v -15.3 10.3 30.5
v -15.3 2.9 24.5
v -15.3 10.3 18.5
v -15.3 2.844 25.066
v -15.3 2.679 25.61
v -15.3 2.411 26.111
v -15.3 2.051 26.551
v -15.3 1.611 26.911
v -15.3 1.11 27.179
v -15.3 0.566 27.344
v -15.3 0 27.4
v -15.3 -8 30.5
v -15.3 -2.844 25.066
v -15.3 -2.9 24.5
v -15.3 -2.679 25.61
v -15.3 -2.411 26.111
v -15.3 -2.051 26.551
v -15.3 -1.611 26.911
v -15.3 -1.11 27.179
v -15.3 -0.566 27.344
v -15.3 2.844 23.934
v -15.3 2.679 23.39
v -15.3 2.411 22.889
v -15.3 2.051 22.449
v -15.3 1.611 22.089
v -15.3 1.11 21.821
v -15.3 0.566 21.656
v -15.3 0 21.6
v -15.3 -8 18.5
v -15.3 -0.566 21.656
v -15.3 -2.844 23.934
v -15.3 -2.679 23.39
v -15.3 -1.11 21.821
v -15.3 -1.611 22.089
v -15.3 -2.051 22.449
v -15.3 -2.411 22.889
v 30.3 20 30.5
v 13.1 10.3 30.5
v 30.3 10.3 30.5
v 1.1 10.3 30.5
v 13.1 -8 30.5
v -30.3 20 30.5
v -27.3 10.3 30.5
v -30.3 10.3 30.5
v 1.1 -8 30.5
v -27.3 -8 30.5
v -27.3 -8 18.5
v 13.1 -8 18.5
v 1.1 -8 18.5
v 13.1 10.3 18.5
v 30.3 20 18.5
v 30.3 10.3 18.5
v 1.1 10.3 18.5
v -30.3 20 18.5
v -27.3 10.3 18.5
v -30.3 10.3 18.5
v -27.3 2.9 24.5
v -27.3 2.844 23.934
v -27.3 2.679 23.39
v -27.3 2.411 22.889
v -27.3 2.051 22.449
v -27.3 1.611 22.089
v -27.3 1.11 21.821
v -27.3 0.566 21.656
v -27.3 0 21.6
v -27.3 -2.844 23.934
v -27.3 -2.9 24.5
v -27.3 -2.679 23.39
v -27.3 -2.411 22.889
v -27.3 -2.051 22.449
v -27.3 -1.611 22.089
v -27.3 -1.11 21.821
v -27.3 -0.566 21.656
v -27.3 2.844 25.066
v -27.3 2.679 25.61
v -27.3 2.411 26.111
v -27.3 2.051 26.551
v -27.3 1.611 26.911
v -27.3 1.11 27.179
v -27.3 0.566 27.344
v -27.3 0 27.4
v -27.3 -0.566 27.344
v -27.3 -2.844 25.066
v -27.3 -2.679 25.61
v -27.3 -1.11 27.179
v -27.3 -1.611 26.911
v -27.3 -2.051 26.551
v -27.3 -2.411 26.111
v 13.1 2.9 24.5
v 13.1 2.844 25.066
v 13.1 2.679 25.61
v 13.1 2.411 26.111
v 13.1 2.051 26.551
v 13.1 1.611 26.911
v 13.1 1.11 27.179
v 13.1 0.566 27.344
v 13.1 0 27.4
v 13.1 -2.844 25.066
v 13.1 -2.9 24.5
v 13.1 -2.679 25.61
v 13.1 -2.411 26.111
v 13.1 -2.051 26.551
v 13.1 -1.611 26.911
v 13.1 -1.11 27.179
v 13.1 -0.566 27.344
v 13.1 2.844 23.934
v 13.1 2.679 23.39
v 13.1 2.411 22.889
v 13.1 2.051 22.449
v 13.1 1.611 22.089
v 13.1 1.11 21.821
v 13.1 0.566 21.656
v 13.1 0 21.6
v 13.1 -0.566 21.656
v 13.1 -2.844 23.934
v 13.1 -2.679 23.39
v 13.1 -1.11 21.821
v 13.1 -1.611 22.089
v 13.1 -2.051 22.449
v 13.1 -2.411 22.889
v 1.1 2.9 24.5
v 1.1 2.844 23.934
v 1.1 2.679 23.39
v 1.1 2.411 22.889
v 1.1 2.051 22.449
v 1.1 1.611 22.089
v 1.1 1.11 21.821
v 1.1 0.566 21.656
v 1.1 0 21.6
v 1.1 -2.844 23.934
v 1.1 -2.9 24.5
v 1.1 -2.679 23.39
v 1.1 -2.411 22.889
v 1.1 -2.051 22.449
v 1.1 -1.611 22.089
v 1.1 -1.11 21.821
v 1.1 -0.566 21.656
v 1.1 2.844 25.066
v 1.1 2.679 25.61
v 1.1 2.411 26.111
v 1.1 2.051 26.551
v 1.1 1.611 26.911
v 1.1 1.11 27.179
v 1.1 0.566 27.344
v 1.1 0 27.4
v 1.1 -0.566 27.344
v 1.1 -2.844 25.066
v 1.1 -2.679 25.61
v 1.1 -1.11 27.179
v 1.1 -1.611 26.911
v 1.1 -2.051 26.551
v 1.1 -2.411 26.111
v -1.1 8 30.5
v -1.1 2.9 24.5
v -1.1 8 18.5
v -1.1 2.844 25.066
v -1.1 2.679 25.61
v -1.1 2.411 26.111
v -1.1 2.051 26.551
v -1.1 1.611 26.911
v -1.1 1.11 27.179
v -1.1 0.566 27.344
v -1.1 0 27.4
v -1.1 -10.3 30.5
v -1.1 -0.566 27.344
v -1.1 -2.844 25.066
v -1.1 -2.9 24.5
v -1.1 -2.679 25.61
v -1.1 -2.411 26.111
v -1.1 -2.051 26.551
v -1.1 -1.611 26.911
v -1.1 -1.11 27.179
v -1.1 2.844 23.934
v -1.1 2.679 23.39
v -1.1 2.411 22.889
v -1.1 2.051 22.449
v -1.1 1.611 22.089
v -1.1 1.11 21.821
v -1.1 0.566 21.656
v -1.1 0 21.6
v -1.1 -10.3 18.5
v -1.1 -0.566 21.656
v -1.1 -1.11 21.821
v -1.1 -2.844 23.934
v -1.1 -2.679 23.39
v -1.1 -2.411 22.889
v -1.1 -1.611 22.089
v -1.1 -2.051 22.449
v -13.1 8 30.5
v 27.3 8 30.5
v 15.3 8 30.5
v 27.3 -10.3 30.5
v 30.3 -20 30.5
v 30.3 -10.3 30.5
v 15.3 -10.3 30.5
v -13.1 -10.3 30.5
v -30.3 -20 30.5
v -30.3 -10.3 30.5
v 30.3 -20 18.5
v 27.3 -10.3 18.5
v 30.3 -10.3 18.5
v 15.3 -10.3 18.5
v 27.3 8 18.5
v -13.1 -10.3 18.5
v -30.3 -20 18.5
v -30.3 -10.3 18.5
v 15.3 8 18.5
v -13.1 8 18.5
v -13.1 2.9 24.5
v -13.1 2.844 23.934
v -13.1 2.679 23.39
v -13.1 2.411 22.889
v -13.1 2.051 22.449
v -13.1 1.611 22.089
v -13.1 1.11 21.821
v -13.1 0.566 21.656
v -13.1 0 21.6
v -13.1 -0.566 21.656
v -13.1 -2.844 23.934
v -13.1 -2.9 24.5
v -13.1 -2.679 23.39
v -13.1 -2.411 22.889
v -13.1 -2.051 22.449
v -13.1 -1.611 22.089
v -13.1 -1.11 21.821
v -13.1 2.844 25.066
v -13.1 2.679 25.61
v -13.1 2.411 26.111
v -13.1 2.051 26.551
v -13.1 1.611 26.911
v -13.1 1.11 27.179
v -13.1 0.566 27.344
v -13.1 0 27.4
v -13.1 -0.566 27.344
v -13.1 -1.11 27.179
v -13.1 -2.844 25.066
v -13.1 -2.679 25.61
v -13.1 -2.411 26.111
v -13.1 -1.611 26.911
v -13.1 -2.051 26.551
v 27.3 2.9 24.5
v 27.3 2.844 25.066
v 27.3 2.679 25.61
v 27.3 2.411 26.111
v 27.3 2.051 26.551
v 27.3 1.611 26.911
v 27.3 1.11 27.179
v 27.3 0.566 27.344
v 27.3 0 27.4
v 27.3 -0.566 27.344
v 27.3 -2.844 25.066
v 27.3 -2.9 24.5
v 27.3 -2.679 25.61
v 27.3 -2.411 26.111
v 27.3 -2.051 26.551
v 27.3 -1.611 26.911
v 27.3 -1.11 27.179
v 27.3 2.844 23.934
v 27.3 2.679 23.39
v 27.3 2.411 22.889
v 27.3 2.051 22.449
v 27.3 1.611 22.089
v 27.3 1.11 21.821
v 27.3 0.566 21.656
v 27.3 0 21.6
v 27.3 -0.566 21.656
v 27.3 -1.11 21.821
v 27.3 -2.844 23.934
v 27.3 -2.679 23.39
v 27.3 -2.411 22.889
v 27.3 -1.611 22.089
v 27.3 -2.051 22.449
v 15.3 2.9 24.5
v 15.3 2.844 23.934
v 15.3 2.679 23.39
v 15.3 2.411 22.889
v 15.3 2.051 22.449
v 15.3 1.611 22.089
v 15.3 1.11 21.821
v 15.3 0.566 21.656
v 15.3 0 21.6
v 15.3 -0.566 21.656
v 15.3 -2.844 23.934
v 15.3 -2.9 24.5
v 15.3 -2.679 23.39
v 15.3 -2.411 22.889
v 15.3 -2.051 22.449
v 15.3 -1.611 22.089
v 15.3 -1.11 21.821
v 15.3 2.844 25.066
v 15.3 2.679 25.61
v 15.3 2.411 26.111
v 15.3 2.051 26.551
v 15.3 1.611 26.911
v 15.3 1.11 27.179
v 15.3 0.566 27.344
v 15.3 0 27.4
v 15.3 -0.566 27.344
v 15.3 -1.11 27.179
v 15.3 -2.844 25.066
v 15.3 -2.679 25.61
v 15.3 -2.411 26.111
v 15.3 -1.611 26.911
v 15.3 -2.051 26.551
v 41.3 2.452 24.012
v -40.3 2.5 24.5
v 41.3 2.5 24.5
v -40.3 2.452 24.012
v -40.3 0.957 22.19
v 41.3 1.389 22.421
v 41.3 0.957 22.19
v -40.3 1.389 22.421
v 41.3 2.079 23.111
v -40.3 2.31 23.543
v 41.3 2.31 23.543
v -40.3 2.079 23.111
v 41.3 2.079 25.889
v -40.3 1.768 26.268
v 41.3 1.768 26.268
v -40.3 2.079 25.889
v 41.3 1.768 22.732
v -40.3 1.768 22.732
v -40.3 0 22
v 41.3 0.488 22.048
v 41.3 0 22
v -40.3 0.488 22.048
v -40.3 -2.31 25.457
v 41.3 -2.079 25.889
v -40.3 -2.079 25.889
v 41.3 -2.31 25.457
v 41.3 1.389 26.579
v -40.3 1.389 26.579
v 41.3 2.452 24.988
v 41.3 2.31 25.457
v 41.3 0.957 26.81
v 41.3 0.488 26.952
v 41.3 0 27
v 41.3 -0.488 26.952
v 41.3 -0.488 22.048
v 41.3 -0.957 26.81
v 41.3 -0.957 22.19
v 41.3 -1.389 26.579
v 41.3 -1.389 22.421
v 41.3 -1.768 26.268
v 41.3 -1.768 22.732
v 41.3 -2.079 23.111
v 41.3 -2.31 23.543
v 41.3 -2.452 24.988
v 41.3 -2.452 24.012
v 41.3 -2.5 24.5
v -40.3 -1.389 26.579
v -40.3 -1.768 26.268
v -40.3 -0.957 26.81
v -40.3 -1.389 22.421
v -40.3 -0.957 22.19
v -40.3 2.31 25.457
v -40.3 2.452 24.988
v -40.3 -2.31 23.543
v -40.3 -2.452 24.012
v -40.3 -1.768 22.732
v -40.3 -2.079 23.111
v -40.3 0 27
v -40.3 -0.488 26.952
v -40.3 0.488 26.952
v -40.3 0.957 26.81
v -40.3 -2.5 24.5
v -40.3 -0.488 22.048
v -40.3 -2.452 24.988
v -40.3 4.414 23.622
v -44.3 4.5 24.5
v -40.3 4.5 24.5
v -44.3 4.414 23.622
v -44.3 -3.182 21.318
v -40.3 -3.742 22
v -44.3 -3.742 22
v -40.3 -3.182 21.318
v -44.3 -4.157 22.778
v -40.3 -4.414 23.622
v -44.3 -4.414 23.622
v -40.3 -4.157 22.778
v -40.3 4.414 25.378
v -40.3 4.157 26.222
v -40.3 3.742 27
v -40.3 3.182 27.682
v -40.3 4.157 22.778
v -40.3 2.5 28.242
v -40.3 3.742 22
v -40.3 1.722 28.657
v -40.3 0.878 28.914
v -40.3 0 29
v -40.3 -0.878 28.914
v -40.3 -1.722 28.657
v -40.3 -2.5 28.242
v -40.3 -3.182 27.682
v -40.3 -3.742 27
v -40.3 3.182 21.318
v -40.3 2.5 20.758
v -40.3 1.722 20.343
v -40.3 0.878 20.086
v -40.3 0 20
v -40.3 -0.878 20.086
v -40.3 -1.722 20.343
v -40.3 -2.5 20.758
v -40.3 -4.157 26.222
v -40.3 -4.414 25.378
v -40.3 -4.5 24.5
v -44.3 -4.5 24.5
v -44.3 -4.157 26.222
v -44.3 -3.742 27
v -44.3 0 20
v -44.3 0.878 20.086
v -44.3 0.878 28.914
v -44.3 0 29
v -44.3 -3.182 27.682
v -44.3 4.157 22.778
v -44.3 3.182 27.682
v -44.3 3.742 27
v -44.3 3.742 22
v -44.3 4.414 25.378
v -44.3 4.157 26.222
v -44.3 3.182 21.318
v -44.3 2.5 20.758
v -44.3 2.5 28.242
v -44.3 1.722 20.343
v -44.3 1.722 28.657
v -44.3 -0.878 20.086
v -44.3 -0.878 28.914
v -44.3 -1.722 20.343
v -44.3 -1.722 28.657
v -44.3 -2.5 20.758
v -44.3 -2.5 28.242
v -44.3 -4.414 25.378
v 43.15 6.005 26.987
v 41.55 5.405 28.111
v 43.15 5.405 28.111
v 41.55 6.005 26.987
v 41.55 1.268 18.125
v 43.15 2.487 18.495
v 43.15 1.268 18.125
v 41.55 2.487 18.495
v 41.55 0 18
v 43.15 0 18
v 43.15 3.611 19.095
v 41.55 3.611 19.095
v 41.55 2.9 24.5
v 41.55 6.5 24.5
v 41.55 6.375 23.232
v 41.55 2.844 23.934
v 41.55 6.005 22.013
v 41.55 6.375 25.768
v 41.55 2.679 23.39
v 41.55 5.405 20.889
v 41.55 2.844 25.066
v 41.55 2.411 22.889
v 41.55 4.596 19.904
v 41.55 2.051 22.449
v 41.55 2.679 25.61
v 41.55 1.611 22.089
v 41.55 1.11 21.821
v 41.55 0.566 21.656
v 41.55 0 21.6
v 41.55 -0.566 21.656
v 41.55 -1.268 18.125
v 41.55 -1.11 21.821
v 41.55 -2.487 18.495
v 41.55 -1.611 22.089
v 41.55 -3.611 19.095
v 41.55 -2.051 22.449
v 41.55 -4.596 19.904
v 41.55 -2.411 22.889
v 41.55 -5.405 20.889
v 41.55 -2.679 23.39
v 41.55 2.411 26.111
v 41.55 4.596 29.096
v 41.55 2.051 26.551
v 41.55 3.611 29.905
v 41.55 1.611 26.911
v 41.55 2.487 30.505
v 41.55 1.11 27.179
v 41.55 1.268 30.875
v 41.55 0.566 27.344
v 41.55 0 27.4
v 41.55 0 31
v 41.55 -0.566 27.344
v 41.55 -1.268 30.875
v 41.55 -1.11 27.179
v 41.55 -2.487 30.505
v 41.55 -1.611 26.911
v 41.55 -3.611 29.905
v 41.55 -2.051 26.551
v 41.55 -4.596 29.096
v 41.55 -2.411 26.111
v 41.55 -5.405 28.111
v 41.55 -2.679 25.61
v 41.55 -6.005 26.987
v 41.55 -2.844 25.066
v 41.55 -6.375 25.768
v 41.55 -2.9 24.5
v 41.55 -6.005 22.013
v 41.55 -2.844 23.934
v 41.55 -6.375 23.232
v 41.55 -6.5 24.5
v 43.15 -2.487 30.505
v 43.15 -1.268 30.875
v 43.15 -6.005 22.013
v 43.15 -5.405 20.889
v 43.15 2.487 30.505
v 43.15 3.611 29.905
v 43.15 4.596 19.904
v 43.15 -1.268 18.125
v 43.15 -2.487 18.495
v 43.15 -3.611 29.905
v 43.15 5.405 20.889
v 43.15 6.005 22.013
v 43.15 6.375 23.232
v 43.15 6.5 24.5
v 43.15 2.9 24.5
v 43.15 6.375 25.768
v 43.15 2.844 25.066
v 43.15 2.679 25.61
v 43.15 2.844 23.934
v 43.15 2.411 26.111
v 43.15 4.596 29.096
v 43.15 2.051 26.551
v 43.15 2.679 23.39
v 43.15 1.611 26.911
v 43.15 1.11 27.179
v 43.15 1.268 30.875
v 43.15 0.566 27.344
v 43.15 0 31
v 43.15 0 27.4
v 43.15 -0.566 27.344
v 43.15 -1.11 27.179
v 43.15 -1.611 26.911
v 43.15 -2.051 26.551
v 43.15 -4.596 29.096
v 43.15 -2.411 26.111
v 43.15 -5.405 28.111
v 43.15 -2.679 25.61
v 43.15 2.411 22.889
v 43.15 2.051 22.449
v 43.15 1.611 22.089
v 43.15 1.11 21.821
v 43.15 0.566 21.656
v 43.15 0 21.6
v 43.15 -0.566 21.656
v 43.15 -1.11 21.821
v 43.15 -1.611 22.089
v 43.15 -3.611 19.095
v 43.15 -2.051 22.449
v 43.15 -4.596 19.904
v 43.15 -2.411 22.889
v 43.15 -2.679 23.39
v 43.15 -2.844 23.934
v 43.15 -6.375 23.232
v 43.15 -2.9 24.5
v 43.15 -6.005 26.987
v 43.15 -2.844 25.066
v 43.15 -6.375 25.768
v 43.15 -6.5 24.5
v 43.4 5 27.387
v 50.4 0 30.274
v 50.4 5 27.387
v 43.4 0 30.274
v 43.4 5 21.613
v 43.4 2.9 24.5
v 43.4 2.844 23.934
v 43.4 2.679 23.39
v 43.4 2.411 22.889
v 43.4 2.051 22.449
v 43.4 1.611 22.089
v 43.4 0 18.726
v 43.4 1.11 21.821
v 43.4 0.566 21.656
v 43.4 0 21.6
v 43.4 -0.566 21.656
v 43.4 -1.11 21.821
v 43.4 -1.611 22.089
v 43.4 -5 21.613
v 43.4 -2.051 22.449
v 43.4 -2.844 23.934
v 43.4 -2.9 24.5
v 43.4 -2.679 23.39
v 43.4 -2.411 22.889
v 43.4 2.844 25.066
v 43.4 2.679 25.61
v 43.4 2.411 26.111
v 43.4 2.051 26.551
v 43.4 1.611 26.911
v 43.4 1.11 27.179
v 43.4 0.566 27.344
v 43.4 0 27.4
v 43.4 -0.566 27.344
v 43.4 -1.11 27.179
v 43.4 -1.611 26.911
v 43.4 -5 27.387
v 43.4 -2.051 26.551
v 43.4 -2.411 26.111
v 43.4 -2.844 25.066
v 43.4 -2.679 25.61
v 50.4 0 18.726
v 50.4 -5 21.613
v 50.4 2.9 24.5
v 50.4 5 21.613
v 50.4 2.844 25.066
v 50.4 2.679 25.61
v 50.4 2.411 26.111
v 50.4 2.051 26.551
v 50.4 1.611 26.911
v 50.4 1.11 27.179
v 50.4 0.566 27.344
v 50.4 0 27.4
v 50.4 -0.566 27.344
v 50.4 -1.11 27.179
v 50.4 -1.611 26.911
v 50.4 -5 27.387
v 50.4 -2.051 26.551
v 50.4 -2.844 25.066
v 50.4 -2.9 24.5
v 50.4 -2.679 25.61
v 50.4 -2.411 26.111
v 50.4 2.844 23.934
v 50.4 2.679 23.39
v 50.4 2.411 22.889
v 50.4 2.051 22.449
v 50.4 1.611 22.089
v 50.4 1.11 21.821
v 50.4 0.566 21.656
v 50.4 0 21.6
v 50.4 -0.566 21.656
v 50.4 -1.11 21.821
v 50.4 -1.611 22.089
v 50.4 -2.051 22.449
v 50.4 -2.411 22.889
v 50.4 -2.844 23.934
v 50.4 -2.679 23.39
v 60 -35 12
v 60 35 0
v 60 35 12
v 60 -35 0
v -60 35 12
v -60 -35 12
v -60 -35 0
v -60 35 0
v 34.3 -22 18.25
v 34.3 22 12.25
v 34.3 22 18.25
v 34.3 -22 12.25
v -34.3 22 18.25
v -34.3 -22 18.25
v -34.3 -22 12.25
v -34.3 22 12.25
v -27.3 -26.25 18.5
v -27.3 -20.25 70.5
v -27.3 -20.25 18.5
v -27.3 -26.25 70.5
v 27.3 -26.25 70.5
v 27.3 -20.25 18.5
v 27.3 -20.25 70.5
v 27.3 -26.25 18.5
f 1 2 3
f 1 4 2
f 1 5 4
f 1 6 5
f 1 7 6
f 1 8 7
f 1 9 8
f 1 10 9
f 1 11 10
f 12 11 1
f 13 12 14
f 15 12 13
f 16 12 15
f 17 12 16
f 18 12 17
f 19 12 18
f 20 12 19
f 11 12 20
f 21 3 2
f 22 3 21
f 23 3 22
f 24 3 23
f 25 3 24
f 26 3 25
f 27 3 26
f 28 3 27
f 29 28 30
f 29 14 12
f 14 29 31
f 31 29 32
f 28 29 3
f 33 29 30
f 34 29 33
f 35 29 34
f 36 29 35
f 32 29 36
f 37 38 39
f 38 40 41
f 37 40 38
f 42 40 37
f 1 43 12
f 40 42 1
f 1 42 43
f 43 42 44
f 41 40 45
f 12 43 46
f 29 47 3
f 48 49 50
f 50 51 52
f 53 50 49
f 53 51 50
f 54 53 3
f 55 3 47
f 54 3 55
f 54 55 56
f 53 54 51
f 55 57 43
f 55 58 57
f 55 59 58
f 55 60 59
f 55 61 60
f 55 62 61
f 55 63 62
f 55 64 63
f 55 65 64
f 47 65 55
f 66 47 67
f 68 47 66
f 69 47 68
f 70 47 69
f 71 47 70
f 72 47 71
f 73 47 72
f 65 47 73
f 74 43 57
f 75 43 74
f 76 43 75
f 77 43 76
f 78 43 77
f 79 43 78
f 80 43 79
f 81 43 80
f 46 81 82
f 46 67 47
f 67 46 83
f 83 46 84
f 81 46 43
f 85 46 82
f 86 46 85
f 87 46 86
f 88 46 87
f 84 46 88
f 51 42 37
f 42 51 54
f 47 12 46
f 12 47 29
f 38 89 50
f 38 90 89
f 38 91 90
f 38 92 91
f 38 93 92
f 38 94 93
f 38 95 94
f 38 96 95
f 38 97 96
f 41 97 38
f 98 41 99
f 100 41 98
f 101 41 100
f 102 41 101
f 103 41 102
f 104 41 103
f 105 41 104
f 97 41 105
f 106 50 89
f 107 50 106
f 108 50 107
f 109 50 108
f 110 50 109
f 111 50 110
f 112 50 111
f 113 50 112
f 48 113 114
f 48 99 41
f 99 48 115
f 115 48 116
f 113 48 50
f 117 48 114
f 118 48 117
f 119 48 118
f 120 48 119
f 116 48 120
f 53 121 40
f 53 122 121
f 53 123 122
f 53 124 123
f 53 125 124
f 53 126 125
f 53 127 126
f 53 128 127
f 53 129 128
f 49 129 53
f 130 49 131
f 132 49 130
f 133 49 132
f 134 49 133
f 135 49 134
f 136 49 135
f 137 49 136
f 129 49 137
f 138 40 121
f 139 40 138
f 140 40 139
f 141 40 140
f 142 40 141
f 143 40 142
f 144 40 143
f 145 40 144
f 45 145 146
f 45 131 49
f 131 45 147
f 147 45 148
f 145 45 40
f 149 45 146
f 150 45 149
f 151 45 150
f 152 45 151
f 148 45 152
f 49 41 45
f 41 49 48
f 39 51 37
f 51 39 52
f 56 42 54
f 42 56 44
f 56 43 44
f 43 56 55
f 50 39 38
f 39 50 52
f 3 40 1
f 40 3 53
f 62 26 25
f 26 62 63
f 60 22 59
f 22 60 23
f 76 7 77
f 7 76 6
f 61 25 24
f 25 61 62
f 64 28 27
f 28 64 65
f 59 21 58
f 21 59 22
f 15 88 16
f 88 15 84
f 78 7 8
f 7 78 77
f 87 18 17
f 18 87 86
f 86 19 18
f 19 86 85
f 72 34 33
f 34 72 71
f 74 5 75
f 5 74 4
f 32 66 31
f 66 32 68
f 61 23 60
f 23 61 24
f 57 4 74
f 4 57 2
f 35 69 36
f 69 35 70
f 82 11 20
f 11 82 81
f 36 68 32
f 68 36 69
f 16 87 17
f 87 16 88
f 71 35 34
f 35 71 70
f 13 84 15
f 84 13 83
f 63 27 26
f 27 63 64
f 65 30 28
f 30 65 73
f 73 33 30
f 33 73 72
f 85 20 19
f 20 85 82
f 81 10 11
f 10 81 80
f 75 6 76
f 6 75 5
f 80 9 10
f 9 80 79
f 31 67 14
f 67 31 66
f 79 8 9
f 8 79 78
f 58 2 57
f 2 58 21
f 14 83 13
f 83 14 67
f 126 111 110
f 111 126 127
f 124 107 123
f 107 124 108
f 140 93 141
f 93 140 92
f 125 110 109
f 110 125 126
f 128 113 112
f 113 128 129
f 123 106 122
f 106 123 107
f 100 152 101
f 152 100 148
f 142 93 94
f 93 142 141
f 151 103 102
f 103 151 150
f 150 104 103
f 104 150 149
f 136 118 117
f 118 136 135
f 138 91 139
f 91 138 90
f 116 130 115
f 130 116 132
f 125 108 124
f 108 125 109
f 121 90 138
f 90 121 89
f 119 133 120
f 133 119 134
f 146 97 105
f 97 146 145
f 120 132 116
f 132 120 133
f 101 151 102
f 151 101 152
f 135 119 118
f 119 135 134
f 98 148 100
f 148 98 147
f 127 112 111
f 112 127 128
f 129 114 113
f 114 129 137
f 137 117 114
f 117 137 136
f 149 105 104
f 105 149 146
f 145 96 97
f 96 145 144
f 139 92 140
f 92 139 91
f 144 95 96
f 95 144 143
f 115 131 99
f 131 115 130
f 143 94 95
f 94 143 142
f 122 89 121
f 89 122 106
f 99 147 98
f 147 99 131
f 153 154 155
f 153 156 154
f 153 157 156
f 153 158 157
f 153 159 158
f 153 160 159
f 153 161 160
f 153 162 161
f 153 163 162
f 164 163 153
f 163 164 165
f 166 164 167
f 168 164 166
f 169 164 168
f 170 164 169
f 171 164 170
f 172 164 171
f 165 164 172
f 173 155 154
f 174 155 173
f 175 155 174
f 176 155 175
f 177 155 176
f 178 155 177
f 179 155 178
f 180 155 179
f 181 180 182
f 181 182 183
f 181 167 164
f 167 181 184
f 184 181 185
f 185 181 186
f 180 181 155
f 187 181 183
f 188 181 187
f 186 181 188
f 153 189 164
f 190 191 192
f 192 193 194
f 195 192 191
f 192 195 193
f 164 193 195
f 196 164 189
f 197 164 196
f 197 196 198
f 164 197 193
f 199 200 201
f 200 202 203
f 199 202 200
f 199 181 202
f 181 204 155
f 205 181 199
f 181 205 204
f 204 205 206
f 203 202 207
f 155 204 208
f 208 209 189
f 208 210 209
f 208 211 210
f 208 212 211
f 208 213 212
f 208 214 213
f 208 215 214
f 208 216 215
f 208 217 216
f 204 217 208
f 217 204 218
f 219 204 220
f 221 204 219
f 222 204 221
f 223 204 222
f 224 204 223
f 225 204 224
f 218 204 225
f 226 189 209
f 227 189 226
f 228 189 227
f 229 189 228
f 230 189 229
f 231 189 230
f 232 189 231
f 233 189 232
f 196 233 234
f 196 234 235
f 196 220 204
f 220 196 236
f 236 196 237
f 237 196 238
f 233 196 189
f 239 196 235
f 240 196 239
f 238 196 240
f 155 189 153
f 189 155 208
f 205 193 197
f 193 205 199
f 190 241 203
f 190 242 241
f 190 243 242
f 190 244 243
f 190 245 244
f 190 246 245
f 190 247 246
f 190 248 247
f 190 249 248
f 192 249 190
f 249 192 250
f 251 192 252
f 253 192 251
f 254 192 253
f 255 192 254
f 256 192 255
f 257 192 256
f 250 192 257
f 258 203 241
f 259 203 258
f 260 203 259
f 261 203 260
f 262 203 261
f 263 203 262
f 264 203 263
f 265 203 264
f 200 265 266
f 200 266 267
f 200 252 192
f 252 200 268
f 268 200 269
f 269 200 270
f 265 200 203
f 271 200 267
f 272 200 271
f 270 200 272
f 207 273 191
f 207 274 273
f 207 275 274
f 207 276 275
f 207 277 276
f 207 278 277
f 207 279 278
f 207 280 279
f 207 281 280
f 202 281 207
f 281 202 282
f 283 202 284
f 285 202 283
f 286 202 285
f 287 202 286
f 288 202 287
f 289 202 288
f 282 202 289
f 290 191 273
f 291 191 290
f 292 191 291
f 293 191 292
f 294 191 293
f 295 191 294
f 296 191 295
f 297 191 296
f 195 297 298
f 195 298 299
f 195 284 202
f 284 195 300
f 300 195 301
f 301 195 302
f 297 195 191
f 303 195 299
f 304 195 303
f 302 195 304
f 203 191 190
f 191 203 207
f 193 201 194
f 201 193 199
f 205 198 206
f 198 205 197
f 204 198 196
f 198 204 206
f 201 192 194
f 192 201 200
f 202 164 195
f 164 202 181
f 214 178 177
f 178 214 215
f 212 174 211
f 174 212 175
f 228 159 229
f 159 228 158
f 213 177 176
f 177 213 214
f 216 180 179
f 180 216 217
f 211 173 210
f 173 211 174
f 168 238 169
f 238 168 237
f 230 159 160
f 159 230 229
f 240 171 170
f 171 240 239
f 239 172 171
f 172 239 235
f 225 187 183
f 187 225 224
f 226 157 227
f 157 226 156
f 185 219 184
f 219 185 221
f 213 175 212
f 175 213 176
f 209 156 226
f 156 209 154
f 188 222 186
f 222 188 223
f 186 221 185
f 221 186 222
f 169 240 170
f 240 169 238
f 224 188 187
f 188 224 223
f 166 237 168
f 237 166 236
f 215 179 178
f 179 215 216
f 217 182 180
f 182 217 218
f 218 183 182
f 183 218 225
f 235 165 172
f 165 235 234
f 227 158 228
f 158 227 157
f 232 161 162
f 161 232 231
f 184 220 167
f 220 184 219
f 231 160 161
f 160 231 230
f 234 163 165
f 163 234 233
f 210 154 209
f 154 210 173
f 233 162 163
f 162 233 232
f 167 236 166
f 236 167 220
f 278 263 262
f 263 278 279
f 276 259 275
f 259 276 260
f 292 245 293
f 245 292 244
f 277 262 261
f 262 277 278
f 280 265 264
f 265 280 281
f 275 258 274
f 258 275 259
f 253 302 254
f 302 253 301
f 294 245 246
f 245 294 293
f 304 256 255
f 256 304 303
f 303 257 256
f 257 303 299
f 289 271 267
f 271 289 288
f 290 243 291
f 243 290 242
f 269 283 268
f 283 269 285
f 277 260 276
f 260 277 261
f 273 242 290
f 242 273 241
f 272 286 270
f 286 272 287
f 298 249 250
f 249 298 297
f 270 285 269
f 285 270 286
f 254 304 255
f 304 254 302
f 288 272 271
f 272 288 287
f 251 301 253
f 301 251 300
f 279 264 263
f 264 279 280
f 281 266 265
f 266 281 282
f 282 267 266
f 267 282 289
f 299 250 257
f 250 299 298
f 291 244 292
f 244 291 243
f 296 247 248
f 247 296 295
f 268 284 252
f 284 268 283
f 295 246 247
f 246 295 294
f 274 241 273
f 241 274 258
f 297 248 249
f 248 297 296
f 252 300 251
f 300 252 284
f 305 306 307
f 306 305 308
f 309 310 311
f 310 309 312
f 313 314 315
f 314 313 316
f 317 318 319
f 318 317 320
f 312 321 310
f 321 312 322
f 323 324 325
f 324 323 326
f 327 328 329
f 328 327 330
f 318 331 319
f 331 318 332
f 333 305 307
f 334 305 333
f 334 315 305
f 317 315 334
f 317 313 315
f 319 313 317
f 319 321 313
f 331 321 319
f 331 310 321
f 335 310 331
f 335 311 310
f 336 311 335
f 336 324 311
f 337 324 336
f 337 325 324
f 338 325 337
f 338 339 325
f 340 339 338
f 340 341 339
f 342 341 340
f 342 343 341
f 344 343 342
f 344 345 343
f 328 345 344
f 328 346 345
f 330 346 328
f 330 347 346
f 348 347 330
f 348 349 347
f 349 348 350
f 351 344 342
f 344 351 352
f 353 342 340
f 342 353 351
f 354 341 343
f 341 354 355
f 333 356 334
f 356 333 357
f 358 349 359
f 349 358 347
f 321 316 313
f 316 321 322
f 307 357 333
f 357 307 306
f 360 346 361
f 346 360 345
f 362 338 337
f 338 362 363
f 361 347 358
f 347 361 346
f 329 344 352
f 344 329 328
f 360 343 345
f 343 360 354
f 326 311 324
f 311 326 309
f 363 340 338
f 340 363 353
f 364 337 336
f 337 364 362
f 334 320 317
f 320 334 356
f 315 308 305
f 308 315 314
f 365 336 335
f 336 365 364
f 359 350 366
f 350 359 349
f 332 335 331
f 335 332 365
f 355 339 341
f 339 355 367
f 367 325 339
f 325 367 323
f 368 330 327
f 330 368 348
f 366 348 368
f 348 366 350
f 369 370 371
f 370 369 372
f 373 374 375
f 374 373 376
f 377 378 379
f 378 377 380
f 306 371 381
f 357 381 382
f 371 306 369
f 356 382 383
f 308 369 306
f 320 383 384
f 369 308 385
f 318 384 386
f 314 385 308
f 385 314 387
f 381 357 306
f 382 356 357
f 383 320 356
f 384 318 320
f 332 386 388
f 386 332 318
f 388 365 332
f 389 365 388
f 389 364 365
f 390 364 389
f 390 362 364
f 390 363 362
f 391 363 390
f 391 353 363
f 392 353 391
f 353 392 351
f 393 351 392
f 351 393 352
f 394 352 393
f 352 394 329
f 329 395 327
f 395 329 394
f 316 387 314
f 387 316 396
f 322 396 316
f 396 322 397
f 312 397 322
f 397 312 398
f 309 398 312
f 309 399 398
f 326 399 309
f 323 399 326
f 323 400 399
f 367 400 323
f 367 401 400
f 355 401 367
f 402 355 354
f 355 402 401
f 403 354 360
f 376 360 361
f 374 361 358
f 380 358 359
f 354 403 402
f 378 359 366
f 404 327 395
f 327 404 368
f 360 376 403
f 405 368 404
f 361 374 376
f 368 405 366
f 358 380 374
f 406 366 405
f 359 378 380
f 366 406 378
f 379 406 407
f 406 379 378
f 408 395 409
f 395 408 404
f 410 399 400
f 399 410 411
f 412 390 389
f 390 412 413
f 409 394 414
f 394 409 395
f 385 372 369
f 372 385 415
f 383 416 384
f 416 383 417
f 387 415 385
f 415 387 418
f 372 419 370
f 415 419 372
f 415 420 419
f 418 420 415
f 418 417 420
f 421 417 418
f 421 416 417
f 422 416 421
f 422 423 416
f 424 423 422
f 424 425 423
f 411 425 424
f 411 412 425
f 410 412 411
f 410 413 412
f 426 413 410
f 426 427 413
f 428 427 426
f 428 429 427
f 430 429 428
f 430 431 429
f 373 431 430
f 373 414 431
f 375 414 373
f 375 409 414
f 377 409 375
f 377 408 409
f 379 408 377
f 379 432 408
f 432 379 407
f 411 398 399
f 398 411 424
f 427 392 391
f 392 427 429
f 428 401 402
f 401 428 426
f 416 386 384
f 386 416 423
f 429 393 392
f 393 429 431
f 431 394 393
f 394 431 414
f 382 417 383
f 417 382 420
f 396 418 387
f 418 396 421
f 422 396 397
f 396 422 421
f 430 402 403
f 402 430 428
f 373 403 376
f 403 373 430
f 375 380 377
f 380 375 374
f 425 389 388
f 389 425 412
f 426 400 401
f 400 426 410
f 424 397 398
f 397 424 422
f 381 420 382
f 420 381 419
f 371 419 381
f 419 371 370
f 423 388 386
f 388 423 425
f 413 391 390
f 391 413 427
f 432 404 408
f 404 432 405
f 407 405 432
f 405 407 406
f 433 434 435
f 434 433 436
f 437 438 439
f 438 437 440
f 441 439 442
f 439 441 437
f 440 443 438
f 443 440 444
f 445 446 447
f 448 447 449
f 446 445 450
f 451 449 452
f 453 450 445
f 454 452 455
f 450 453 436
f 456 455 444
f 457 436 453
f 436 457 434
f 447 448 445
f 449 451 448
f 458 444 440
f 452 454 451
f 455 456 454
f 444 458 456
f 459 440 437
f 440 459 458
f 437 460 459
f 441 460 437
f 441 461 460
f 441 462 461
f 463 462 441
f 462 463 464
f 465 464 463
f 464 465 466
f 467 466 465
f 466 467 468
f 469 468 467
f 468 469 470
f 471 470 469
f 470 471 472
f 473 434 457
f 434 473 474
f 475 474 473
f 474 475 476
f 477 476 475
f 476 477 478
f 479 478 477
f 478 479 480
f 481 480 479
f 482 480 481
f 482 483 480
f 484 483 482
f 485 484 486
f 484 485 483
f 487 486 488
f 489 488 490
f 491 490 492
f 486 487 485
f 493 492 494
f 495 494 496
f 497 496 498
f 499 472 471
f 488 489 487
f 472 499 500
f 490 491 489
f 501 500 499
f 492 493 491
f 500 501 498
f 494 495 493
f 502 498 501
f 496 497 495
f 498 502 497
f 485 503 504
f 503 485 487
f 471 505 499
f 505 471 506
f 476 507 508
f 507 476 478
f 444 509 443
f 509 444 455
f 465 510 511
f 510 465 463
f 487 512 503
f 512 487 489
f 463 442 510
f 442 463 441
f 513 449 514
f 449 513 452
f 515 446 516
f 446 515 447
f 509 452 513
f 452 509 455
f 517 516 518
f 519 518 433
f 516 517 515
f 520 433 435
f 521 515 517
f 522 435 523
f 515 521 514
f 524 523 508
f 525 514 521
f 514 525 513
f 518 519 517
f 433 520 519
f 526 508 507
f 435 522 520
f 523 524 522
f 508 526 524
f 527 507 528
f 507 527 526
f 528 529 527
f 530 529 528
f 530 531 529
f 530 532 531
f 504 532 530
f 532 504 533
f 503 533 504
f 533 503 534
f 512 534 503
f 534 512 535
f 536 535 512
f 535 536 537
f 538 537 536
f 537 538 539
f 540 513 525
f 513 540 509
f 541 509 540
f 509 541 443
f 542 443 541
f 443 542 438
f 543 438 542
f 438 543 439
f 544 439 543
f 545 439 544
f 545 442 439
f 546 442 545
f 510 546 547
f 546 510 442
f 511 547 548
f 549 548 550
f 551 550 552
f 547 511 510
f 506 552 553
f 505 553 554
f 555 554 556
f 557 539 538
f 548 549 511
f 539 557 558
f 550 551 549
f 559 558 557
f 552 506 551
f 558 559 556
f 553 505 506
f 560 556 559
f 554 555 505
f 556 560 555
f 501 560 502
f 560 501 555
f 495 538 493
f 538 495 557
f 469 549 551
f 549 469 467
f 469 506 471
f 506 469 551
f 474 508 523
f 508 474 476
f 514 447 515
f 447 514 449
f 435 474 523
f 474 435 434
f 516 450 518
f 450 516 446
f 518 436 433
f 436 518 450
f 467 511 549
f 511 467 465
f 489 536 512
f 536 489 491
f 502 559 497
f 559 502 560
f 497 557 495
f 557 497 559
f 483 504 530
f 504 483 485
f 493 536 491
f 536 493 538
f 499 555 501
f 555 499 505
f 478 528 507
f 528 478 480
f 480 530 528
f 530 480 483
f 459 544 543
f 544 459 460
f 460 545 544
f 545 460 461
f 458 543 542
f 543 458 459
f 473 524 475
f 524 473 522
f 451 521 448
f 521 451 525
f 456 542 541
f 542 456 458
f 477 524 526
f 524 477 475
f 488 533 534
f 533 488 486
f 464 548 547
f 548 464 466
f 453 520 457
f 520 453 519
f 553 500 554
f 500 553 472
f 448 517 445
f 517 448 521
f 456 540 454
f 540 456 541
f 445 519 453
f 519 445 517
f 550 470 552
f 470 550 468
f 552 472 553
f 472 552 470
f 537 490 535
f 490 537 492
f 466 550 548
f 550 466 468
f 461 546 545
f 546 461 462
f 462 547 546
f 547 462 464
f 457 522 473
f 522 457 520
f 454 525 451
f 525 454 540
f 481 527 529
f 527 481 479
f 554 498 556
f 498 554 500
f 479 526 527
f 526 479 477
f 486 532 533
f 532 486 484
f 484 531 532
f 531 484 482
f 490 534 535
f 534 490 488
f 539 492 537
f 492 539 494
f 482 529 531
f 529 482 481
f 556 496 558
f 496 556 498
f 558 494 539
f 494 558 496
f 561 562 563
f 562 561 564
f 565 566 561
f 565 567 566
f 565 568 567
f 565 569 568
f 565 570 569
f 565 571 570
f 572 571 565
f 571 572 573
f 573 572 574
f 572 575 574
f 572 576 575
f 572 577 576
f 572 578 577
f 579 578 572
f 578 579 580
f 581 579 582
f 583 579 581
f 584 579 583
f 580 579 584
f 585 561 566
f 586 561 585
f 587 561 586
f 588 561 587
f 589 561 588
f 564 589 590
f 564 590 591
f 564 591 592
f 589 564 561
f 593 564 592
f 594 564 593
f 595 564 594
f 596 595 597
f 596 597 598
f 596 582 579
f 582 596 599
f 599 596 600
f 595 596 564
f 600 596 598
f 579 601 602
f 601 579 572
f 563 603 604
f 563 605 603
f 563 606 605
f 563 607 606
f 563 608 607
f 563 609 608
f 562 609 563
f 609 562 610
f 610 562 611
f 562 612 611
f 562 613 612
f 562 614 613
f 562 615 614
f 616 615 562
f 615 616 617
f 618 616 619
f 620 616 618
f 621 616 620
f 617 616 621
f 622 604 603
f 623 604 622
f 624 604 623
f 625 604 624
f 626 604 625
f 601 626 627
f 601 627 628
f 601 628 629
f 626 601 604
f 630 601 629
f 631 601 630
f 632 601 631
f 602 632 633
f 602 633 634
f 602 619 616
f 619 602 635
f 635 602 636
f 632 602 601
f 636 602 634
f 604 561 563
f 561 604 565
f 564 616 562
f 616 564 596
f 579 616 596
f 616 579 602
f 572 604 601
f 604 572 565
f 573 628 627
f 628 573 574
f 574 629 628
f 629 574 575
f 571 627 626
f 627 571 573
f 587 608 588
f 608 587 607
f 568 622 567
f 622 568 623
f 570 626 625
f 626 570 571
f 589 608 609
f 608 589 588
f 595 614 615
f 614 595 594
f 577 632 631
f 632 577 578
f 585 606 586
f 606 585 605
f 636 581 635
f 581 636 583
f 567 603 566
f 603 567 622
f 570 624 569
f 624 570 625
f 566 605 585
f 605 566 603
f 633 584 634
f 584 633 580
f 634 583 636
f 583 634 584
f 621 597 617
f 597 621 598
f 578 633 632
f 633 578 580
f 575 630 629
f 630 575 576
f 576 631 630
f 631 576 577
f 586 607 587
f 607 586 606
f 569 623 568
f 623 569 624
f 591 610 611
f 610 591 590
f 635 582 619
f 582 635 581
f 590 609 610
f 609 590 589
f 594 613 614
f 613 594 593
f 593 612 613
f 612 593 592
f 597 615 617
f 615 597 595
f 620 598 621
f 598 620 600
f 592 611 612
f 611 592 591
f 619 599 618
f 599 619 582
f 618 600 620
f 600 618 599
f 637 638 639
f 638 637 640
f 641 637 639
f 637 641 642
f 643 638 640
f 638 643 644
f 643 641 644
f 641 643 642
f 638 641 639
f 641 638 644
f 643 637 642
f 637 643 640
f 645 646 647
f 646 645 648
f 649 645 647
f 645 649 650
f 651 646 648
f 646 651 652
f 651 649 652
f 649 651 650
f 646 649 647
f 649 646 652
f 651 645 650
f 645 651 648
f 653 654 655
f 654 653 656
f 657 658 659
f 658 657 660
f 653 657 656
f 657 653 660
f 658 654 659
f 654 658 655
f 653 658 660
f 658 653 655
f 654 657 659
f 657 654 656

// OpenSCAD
$fn = 32;

// ------------------------------------------------------------------------
// Comb hinge with flap: leaf 60.6 x 20 mm, pin d5, flap 52 mm
// Every part is its own module, assembly() places every instance.
// ------------------------------------------------------------------------

// --- part 1 ---
module hinge_bed() {
  difference() {
    translate([-60, -35, 0]) cube([120, 70, 12]);
  }
}

// --- part 2 ---
module hinge_riser() {
  difference() {
    translate([-34.3, -22, 0]) cube([68.6, 44, 6]);
  }
}

// --- part 3 ---
module hinge_leaf_a() {
  difference() {
    union() {
      translate([-27.3, -8, -6]) cube([12, 28, 12]);
      translate([1.1, -8, -6]) cube([12, 28, 12]);
      translate([-30.3, 10.3, -6]) cube([60.6, 9.7, 12]);
    }
    translate([-21.3, 0, 0]) rotate([0, 90, 0]) cylinder(h = 14, d = 5.8, center = true);
    translate([7.1, 0, 0]) rotate([0, 90, 0]) cylinder(h = 14, d = 5.8, center = true);
  }
}

// --- part 4 ---
module hinge_leaf_b() {
  difference() {
    union() {
      translate([-13.1, -20, -6]) cube([12, 28, 12]);
      translate([15.3, -20, -6]) cube([12, 28, 12]);
      translate([-30.3, -20, -6]) cube([60.6, 9.7, 12]);
    }
    translate([-7.1, 0, 0]) rotate([0, 90, 0]) cylinder(h = 14, d = 5.8, center = true);
    translate([21.3, 0, 0]) rotate([0, 90, 0]) cylinder(h = 14, d = 5.8, center = true);
  }
}

// --- part 5 ---
module hinge_flap() {
  difference() {
    translate([-27.3, -26, 0]) cube([54.6, 52, 6]);
  }
}

// --- part 6 ---
module hinge_pin() {
  rotate([0, 90, 0]) cylinder(h = 82.6, d = 5, center = true);
  translate([-44.3, 0, 0]) rotate([0, 90, 0]) cylinder(h = 4, d = 9);
}

// --- part 7 ---
module pin_washer() {
  difference() {
      translate([0, 0, 0]) cylinder(h = 1.6, d = 13);
      translate([0, 0, -1]) cylinder(h = 3.6, d = 5.8);
    }
}

// --- part 8 ---
module pin_nut() {
  difference() {
    linear_extrude(height = 7) polygon(points = [[5.774, 0], [2.887, 5], [-2.887, 5], [-5.774, 0], [-2.887, -5], [2.887, -5]]);
    translate([0, 0, -1]) cylinder(h = 9, d = 5.8);
  }
}

// --- assembly ---
module assembly() {
  color([0.80, 0.24, 0.20]) translate([0, 0, 0]) rotate([0, 0, 0]) hinge_bed();
  color([0.20, 0.45, 0.75]) translate([0, 0, 12.25]) rotate([0, 0, 0]) hinge_riser();
  color([0.25, 0.62, 0.32]) translate([0, 0, 24.5]) rotate([0, 0, 0]) hinge_leaf_a();
  color([0.92, 0.70, 0.18]) translate([0, 0, 24.5]) rotate([0, 0, 0]) hinge_leaf_b();
  color([0.58, 0.35, 0.70]) translate([0, -20.25, 44.5]) rotate([90, 0, 0]) hinge_flap();
  color([0.16, 0.66, 0.66]) translate([0, 0, 24.5]) rotate([0, 0, 0]) hinge_pin();
  color([0.85, 0.48, 0.18]) translate([41.55, 0, 24.5]) rotate([0, 90, 0]) pin_washer();
  color([0.55, 0.60, 0.65]) translate([43.4, 0, 24.5]) rotate([0, 90, 0]) pin_nut();
}

assembly();
